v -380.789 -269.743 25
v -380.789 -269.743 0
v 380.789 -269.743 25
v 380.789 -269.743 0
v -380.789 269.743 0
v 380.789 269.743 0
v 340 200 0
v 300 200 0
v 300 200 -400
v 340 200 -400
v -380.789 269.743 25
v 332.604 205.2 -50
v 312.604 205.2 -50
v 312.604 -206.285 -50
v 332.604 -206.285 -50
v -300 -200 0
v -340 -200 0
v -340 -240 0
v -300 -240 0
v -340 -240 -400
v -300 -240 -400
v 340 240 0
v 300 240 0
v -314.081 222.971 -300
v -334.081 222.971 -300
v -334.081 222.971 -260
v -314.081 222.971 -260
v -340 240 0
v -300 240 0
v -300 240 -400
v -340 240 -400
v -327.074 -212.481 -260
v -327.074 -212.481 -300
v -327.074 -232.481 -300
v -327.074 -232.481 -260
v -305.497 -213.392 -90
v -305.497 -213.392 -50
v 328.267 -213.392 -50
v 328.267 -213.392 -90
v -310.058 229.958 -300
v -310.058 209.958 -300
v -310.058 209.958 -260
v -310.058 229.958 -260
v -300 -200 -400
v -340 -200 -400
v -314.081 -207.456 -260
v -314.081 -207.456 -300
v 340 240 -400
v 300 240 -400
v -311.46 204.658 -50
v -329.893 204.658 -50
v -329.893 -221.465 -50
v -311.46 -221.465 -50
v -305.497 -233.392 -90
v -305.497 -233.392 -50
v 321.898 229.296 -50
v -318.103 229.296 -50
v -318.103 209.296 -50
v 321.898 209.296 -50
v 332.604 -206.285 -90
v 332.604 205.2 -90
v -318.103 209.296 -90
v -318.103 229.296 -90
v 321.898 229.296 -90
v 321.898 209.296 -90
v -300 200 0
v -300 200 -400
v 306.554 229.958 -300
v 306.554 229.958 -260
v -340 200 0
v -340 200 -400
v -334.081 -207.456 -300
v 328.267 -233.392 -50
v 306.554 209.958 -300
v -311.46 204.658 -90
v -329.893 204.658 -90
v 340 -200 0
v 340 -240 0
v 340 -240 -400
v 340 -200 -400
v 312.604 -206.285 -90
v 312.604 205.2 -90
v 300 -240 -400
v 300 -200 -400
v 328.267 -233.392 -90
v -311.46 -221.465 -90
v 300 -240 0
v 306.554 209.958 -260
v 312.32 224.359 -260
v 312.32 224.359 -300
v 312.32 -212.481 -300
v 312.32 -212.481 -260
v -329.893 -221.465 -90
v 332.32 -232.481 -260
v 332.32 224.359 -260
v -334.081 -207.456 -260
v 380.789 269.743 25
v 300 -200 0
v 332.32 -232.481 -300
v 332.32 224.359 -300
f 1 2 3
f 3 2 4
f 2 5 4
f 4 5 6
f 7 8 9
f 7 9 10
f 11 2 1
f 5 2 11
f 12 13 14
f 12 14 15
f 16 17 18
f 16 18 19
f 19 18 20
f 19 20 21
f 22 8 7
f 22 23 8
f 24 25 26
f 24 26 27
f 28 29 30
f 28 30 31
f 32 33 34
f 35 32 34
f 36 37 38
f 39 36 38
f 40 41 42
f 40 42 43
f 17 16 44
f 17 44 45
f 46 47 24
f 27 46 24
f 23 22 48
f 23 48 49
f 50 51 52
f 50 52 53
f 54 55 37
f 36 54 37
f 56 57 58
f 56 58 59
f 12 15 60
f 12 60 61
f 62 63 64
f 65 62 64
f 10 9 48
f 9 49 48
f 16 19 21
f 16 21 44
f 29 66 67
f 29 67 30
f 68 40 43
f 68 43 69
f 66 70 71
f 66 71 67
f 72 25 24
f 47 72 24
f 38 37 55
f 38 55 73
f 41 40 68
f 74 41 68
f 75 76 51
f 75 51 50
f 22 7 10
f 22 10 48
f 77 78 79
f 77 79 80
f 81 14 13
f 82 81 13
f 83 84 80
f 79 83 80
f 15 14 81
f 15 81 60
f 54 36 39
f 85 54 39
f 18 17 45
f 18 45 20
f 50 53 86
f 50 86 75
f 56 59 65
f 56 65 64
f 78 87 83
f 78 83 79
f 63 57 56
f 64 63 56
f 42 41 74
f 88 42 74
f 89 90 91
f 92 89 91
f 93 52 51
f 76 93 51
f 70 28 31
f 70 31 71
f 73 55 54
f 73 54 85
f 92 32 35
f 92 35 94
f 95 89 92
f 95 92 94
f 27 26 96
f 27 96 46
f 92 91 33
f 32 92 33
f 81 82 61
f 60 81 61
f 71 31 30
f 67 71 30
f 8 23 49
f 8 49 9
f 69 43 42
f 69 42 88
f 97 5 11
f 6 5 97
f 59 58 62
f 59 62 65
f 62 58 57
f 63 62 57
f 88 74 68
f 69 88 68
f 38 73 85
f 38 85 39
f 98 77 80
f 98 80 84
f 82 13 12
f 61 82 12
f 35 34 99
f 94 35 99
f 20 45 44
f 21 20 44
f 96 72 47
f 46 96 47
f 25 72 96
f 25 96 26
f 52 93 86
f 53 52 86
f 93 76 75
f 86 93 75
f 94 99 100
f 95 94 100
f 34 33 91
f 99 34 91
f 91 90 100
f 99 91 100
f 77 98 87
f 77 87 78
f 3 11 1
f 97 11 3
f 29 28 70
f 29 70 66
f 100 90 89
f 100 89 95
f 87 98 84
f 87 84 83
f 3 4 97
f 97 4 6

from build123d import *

# Parameters (mm, degrees)
F0_W     = 20
F0_H     = 20
F1_DEPTH = 400
F3_W     = 18.432826
F3_H     = 426.123023
F3_W_2   = 640.000152
F3_H_2   = 20
F3_W_3   = 20
F3_H_3   = 411.485196
F3_W_4   = 633.763074
F4_DEPTH = 40
F6_W     = 20
F6_H     = 436.839668
F6_H_2   = 11.878408
F6_H_3   = 430.427
F6_W_2   = 616.611719
F6_H_4   = 20
F7_DEPTH = 40
F8_W     = 761.578858
F8_H     = 539.486886
F9_DEPTH = 25


with BuildPart() as f1:
    # F0 (on Top) → F1 (new body)
    with BuildSketch(Plane.XY):
        Polygon((-320, 220), (-300, 220), (-300, 240), (-340, 240), (-340, 200), (-320, 200), align=None)
        with Locations((-310, 210)):
            Rectangle(F0_W, F0_H)
        with Locations((310, 210)):
            Rectangle(F0_W, F0_H)
        Polygon((300, 220), (320, 220), (320, 200), (340, 200), (340, 240), (300, 240), align=None)
        with Locations((310, -210)):
            Rectangle(F0_W, F0_H)
        Polygon((340, -200), (320, -200), (320, -220), (300, -220), (300, -240), (340, -240), align=None)
        with Locations((-310, -210)):
            Rectangle(F0_W, F0_H)
        Polygon((-320, -220), (-320, -200), (-340, -200), (-340, -240), (-300, -240), (-300, -220), align=None)
    extrude(amount=-F1_DEPTH)


with BuildPart() as f4:
    # F3 (on offset) → F4 (new body)
    with BuildSketch(Plane.XY.offset(-50)):
        with Locations((-320.67655, -8.403197)):
            Rectangle(F3_W, F3_H)
        with Locations((1.897499, 219.296135)):
            Rectangle(F3_W_2, F3_H_2)
        with Locations((322.603663, -0.542134)):
            Rectangle(F3_W_3, F3_H_3)
        with Locations((11.384964, -223.391806)):
            Rectangle(F3_W_4, F3_H_2)
    extrude(amount=-F4_DEPTH)


with BuildPart() as f7:
    # F6 (on offset) → F7 (new body)
    with BuildSketch(Plane.XY.offset(-300)):
        with Locations((322.319761, 5.939204)):
            Rectangle(F6_W, F6_H)
        with Locations((322.319761, -218.419834)):
            Rectangle(F6_W, F6_H_2)
        Polygon((312.319761, -224.359038), (312.319761, -212.48063), (-327.074468, -212.48063), (-327.074468, -232.48063), (332.319761, -232.48063), (332.319761, -224.359038), align=None)
        with Locations((-324.081411, 7.757686)):
            Rectangle(F6_W, F6_H_3)
        with Locations((-1.751721, 219.9583)):
            Rectangle(F6_W_2, F6_H_4)
    extrude(amount=F7_DEPTH)


with BuildPart() as f9:
    # F8 (on Top) → F9 (new body)
    with BuildSketch(Plane.XY):
        Rectangle(F8_W, F8_H)
    extrude(amount=F9_DEPTH)


solid = Compound([f1.part, f4.part, f7.part, f9.part])
